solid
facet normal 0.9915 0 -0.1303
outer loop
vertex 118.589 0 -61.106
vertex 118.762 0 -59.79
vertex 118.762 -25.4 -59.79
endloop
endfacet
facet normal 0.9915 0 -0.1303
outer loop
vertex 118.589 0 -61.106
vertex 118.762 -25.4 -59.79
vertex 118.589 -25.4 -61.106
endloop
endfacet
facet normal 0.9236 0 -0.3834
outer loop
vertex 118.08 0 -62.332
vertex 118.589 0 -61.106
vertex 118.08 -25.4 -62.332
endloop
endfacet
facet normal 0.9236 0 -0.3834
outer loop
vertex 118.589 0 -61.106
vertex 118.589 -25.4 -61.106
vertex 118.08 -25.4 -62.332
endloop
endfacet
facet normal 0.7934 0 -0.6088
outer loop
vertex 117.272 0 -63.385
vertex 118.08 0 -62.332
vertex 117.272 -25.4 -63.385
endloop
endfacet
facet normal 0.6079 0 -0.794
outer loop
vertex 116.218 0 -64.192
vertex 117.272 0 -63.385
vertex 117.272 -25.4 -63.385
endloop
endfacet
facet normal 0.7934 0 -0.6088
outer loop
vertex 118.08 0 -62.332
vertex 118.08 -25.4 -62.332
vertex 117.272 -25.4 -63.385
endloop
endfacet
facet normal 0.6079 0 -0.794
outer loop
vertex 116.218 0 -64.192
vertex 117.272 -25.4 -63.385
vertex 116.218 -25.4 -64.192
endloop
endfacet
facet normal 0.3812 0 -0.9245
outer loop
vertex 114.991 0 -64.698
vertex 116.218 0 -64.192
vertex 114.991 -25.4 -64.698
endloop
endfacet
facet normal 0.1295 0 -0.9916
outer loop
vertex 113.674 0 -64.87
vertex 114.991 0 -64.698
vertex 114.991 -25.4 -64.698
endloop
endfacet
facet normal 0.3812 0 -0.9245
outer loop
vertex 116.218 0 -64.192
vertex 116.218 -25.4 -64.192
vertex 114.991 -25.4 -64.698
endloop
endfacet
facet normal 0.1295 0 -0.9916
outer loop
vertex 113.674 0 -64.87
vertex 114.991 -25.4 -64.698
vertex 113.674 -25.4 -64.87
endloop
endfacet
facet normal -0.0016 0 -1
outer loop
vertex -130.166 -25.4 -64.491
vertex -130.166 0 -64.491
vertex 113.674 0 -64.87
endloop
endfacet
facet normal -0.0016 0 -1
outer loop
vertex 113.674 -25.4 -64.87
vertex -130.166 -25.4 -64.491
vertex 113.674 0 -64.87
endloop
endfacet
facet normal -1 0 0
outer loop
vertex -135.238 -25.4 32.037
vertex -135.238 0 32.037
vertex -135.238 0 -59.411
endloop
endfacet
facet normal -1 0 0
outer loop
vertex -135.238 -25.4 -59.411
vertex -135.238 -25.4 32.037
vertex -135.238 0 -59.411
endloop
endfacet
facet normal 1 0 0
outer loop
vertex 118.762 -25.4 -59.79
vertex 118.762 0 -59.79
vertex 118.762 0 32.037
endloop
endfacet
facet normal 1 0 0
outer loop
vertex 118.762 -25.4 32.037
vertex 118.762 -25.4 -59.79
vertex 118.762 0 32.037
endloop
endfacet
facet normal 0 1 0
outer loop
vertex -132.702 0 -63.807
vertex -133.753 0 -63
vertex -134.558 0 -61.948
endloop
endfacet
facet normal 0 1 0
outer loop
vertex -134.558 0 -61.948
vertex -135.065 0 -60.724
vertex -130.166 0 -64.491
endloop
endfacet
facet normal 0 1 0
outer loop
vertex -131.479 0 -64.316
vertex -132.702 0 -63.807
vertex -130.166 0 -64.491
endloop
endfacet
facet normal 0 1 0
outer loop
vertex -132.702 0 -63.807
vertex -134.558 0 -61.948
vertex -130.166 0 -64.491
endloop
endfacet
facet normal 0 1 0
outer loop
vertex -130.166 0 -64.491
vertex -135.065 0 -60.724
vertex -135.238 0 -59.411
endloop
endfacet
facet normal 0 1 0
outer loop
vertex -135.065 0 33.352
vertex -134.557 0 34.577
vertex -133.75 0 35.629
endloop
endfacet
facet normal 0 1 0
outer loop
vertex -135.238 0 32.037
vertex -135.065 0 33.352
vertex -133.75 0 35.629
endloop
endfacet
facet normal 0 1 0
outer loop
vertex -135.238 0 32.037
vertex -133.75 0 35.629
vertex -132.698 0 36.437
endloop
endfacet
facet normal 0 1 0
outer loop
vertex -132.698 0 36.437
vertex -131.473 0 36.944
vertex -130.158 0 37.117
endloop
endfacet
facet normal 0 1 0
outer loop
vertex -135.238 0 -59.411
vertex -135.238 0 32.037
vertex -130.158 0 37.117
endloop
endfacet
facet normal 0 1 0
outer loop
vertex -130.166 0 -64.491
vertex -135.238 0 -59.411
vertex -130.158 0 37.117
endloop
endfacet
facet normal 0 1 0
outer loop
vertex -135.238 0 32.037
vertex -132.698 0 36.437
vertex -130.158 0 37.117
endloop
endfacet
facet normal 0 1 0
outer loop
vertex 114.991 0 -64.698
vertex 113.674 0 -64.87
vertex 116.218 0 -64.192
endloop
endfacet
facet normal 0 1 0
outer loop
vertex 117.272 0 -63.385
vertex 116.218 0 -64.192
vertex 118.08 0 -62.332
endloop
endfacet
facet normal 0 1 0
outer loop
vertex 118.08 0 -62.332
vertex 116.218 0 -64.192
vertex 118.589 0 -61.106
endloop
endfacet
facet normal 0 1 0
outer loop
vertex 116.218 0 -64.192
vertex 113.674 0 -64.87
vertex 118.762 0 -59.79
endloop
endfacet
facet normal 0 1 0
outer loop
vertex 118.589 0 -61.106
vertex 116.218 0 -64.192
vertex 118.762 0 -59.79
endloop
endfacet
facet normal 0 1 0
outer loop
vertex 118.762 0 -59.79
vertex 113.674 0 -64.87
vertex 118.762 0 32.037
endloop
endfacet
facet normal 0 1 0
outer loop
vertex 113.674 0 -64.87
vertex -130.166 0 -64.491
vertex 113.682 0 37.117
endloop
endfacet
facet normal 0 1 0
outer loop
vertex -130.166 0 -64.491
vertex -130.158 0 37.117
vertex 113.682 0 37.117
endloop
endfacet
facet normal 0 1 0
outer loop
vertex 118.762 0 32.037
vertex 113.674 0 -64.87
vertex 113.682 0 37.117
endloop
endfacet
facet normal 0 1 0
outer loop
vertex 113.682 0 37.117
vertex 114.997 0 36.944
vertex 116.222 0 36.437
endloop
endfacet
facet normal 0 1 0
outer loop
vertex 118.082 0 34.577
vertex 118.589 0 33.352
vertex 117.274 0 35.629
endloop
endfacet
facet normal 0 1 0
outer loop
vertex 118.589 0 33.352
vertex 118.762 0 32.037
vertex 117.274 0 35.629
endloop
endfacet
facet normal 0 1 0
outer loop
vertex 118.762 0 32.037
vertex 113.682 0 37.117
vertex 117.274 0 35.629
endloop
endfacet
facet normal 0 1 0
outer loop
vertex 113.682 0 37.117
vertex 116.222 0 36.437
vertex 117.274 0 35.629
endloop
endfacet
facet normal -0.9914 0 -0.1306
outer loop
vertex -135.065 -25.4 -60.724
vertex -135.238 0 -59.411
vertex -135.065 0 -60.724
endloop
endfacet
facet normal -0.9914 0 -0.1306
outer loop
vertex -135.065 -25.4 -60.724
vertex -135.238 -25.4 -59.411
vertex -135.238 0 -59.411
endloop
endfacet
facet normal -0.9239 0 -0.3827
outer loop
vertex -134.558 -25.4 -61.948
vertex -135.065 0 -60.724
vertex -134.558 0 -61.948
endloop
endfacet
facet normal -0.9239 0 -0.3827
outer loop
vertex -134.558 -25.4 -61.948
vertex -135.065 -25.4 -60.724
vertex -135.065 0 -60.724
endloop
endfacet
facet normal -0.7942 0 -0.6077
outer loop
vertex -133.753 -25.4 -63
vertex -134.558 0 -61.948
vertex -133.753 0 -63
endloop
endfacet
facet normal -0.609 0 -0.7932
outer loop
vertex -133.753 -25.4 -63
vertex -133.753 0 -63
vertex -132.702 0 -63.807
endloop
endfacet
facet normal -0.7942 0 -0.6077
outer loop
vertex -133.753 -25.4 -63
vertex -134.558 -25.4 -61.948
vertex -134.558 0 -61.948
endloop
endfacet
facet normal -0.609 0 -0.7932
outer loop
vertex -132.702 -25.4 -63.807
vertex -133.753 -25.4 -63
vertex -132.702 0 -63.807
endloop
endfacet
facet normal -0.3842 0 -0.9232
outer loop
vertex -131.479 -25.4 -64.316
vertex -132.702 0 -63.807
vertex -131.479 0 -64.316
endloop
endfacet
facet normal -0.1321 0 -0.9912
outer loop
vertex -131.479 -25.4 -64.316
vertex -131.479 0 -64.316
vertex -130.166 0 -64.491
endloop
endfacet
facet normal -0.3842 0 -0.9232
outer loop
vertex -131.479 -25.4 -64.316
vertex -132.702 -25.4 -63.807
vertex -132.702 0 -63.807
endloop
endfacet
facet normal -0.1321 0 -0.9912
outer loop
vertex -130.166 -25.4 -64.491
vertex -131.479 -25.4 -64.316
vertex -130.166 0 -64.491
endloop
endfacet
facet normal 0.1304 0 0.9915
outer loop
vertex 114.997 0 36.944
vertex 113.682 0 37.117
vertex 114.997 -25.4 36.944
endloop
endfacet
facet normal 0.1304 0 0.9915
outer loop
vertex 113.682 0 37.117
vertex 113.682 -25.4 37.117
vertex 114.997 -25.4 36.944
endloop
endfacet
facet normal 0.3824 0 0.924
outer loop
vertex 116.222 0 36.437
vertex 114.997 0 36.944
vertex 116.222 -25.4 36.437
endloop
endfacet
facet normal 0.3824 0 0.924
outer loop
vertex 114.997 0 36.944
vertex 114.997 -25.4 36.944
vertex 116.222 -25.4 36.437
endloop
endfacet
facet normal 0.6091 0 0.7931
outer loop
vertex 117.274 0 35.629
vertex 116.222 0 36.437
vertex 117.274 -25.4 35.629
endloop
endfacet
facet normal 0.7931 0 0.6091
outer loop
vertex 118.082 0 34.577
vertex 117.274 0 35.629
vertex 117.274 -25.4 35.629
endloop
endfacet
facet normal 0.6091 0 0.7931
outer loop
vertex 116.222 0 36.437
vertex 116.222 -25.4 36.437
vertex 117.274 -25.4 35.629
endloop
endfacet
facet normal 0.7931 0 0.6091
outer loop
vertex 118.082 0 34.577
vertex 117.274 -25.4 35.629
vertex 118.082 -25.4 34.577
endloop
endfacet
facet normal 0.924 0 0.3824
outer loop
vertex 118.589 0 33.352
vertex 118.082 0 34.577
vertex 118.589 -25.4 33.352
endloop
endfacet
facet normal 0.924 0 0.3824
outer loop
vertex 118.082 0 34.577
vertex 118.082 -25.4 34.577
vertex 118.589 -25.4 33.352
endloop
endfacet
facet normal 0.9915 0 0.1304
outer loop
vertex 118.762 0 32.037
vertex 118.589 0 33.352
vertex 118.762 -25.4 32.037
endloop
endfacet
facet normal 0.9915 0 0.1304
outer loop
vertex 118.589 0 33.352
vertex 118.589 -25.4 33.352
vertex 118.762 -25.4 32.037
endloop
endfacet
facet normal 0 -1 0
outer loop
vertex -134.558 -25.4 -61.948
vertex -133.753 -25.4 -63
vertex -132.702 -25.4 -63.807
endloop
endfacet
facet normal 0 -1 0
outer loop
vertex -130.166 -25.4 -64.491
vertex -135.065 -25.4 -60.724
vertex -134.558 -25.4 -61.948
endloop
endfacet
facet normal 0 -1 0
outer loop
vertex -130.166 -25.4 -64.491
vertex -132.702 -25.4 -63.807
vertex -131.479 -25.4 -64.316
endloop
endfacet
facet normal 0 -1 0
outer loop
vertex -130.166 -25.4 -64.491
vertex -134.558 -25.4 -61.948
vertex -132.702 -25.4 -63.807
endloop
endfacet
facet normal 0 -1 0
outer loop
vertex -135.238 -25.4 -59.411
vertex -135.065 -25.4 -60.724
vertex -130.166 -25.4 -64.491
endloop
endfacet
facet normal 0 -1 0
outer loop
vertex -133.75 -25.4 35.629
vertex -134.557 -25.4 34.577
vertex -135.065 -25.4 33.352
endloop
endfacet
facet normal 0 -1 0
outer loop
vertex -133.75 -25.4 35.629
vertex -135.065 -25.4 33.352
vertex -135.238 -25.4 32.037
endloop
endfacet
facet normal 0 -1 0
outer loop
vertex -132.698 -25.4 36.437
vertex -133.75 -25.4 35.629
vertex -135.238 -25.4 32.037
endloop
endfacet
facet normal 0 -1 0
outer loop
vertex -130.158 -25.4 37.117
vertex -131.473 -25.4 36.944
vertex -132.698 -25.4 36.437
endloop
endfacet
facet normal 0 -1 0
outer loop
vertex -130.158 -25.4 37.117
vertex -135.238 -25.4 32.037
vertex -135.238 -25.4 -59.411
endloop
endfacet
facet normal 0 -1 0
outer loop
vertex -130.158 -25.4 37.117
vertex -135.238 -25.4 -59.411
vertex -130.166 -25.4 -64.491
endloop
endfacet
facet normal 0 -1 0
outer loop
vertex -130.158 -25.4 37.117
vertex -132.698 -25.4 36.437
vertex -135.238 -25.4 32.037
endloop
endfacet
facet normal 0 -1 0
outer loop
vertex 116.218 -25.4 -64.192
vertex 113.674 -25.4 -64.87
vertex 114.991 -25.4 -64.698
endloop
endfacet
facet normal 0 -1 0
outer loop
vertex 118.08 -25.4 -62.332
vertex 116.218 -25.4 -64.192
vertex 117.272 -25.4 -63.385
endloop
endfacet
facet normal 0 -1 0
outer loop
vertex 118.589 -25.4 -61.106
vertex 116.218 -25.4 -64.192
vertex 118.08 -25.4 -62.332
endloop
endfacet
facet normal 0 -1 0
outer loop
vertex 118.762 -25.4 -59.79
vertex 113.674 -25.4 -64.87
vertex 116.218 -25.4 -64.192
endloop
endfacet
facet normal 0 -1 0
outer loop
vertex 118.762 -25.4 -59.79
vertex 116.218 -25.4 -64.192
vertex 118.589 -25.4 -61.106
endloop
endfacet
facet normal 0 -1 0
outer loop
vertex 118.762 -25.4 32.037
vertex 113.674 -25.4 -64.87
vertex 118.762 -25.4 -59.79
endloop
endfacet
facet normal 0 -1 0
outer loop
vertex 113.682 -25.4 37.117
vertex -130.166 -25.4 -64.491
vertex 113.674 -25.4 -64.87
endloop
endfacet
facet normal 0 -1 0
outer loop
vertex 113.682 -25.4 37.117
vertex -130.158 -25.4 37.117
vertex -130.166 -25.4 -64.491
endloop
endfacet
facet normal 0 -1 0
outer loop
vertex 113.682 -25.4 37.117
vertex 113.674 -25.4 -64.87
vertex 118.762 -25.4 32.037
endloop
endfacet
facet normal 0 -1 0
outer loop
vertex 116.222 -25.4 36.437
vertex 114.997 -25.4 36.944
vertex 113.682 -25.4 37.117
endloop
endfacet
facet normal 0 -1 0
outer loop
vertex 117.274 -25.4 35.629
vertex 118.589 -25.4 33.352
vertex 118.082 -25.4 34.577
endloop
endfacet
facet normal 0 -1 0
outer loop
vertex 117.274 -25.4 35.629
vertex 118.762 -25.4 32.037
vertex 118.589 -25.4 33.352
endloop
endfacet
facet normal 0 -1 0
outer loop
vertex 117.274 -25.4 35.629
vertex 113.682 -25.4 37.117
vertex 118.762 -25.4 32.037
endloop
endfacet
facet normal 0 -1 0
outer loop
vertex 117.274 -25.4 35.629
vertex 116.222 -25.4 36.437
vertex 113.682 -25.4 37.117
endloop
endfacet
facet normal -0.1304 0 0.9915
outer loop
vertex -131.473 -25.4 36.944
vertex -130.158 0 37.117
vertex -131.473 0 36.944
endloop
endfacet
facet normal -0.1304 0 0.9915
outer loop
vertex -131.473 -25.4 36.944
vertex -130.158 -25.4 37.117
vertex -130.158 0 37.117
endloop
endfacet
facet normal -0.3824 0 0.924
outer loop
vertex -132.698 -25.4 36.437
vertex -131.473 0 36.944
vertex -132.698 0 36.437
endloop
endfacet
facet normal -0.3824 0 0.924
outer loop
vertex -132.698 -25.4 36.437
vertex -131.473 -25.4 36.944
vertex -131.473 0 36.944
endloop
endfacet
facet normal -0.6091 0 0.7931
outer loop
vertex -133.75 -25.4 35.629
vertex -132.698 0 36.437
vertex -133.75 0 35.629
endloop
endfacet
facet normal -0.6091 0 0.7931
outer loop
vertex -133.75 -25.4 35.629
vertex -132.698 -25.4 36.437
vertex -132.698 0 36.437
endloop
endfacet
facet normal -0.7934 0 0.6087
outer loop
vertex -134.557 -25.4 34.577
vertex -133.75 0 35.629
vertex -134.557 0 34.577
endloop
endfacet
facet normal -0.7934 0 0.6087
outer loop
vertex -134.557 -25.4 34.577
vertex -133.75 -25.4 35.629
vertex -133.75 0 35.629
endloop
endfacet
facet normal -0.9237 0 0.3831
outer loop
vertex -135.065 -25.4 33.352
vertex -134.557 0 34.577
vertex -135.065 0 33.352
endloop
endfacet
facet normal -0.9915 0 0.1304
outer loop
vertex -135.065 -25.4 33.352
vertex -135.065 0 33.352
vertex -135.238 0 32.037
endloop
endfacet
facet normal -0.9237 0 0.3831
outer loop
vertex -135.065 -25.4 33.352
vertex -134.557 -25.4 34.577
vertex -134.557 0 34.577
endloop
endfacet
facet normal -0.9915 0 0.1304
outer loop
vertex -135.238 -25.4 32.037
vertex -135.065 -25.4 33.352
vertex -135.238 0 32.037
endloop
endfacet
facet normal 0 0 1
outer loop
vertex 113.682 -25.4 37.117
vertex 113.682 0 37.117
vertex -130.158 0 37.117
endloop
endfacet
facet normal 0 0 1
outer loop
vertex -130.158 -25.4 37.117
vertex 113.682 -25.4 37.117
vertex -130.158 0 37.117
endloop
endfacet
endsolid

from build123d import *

# Parameters (mm, degrees)
F1_DEPTH = 25.4
F2_R     = 5.08
F3_R     = 5.08


with BuildPart() as f1:
    # F0 (on Front) → F1 (new body)
    with BuildSketch(Plane.XZ):
        Polygon((118.762286, 37.117315), (-135.237714, 37.117315), (-135.237714, -64.482685), (118.762286, -64.877713), align=None)
    extrude(amount=F1_DEPTH)

    # F2
    f2_edges = [f1.edges().sort_by_distance(p)[0] for p in [
        (-135.237714, -12.7, 37.117315),
    ]]
    fillet(f2_edges, radius=F2_R)

    # F3
    f3_edges = [f1.edges().sort_by_distance(p)[0] for p in [
        (118.762286, -12.7, 37.117315),
        (118.762286, -12.7, -64.877713),
        (-135.237714, -12.7, -64.482685),
    ]]
    fillet(f3_edges, radius=F3_R)


solid = f1.part
